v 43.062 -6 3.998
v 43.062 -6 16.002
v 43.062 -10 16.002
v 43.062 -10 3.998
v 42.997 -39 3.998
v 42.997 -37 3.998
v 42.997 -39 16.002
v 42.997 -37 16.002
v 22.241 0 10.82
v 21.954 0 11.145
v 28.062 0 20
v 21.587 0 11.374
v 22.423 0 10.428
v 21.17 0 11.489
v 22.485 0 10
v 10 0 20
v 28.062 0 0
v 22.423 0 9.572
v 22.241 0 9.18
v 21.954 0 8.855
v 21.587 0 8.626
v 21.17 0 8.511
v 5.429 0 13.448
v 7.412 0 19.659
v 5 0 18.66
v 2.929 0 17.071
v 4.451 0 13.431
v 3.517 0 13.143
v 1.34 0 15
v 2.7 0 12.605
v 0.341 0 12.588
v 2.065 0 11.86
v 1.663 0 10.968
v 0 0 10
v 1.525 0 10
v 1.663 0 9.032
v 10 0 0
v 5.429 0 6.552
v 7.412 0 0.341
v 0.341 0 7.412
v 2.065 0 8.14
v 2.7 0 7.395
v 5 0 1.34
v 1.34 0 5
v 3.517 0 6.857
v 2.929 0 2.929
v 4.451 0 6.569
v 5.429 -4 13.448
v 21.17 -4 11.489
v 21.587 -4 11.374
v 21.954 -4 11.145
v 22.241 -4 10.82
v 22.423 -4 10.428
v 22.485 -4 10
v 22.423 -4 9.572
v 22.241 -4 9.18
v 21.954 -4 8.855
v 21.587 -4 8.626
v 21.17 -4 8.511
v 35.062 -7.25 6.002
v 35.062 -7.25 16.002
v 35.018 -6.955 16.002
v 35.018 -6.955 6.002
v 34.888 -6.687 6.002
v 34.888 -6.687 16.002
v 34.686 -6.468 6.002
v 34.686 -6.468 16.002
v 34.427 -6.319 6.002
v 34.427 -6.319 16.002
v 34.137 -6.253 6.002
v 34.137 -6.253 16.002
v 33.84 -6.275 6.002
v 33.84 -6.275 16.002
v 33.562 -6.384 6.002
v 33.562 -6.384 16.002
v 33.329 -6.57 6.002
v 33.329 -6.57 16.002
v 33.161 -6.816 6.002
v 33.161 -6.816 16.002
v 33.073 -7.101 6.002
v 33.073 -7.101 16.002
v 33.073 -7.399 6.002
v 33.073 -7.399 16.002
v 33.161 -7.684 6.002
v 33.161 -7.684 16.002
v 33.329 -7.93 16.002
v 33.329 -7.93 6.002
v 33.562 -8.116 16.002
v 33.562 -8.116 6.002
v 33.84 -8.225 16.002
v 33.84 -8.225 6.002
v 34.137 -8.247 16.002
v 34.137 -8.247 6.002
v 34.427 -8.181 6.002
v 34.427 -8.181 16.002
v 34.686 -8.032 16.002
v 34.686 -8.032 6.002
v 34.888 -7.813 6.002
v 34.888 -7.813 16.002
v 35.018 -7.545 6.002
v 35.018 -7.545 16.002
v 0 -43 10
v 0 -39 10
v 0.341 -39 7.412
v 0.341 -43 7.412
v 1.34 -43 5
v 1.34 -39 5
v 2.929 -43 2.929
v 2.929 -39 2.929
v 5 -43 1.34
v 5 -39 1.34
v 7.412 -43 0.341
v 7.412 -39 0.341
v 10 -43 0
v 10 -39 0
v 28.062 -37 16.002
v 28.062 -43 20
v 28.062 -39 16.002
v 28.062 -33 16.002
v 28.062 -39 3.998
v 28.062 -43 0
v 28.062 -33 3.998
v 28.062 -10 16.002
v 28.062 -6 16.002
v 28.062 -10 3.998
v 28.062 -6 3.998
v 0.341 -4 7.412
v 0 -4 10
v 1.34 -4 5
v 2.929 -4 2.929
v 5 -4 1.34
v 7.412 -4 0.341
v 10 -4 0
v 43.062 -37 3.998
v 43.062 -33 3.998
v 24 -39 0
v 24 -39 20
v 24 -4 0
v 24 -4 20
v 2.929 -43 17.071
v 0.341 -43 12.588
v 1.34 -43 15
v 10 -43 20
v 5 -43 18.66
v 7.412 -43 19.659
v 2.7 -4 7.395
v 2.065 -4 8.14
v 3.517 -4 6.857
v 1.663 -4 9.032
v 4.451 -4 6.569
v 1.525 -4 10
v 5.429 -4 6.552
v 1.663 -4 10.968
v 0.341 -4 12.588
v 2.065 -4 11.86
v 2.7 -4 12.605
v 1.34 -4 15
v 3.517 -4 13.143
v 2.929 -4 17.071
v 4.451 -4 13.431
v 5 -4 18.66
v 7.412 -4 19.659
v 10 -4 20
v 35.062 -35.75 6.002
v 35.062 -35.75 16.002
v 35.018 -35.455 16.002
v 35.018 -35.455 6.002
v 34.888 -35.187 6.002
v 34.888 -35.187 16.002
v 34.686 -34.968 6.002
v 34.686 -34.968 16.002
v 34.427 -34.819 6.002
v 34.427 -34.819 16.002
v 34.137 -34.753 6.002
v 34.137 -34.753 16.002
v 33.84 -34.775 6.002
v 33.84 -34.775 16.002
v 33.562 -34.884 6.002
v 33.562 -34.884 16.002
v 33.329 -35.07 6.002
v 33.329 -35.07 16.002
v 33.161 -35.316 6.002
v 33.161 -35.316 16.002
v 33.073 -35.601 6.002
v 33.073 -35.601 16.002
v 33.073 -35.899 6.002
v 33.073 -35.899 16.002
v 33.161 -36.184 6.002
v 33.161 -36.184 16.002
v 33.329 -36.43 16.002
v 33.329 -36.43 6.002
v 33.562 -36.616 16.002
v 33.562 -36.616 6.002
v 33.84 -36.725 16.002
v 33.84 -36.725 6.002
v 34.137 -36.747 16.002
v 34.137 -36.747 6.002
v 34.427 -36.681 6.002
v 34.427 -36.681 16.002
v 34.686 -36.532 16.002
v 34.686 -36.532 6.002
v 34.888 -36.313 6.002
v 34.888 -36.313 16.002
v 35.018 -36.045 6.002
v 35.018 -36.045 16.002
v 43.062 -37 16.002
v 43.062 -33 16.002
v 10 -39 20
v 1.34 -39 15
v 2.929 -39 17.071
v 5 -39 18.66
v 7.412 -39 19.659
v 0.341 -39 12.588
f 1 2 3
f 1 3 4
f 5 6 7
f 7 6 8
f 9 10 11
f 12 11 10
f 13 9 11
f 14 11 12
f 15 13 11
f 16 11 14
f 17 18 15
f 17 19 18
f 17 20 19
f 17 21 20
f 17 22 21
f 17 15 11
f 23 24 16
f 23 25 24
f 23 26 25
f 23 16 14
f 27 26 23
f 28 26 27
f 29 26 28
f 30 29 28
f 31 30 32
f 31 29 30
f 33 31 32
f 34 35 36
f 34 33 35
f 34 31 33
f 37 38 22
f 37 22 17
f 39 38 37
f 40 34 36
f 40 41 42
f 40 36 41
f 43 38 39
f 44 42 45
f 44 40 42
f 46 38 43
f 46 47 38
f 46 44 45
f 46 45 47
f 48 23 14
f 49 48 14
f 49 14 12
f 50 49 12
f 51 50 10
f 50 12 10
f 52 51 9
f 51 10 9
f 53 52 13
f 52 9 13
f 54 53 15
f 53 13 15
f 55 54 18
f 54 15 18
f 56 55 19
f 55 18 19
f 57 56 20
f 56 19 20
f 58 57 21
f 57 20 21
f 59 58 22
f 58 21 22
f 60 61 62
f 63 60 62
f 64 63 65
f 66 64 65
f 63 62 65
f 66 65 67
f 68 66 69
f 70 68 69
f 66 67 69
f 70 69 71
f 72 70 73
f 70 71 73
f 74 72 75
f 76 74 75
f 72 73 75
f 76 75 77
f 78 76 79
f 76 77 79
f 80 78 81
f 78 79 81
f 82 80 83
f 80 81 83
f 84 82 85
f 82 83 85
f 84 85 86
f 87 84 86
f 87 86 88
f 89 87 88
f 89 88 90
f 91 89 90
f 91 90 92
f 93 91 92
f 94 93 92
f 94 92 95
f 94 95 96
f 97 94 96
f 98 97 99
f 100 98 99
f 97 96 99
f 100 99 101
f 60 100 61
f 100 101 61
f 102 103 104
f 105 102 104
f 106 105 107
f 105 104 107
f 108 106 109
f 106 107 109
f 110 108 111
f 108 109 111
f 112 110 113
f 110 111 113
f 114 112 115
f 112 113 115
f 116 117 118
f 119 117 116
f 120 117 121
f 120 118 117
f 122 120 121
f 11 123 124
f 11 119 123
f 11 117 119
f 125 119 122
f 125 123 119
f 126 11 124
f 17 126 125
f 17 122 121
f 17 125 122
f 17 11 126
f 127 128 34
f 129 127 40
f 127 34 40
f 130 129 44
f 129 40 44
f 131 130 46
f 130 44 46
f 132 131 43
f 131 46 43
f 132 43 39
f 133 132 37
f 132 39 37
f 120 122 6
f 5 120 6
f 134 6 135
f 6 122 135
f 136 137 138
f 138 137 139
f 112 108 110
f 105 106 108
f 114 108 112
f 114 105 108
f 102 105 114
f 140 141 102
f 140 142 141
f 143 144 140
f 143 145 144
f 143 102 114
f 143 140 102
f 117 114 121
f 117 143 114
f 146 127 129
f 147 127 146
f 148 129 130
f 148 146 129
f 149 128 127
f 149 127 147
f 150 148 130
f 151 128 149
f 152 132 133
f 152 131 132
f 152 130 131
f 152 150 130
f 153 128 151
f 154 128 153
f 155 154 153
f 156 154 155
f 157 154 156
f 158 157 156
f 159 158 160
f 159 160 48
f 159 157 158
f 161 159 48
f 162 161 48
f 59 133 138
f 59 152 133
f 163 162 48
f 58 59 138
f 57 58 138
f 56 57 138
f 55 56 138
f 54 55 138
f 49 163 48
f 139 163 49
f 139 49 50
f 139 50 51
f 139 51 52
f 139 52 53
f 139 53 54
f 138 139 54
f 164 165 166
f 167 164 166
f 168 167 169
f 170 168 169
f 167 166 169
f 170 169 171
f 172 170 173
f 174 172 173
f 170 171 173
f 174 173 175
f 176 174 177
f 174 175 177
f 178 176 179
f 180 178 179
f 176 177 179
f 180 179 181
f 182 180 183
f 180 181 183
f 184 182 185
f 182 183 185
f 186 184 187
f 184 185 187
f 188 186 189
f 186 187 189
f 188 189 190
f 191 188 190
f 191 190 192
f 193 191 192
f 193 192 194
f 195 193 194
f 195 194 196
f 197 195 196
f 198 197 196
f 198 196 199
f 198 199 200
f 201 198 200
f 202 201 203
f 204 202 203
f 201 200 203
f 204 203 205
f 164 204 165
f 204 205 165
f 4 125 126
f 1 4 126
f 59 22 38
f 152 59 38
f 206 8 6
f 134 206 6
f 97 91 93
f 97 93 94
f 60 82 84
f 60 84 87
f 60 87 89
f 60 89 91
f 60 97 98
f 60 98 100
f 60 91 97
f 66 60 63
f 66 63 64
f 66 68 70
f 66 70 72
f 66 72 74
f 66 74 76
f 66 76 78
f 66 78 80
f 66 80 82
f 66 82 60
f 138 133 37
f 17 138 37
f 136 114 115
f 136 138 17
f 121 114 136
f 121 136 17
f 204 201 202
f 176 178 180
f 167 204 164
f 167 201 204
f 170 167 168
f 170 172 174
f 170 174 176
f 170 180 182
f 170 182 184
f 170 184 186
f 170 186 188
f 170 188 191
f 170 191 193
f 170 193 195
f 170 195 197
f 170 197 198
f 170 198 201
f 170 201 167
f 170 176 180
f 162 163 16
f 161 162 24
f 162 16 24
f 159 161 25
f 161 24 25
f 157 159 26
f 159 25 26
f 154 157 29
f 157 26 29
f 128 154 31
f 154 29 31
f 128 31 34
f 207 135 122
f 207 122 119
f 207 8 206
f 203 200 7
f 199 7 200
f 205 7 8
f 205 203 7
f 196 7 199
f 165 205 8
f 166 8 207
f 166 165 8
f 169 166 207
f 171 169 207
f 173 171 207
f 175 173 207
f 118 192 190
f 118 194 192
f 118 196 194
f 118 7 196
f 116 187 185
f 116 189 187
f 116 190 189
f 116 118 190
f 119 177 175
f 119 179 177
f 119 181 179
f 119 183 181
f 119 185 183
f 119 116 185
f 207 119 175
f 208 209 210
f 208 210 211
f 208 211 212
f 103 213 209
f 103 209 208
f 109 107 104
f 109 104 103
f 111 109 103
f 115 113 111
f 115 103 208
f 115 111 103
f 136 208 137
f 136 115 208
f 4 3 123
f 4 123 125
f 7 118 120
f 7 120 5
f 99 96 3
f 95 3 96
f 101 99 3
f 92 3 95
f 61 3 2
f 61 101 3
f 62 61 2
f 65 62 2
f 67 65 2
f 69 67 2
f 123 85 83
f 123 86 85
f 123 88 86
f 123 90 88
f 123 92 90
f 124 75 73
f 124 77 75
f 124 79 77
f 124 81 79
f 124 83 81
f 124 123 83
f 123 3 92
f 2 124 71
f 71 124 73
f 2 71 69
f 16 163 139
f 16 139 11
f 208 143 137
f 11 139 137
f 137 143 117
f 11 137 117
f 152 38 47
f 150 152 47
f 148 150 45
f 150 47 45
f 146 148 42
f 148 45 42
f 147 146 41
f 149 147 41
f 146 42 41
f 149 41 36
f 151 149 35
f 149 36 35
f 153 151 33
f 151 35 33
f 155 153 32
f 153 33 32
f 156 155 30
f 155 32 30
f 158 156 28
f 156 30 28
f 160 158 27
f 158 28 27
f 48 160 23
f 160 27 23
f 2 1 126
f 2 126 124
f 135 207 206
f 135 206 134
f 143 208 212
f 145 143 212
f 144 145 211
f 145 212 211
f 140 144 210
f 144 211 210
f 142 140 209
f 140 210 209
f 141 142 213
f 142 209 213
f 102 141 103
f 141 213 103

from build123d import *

# Parameters (mm, degrees)
EXTRUDE_1_DEPTH     = 20
CUT_EXTRUDE_2_DEPTH = 20
SKETCH_6_W          = 20
SKETCH_6_H          = 46
EXTRUDE_2_DEPTH     = 3
SKETCH_7_W          = 4
SKETCH_7_H          = 38
CUT_EXTRUDE_4_DEPTH = 23
SKETCH_8_W          = 27.047351985
SKETCH_8_H          = 20
EXTRUDE_3_DEPTH     = 3
SKETCH_9_W          = 28.062086438
SKETCH_9_H          = 3
CUT_EXTRUDE_5_DEPTH = 50
CUT_EXTRUDE_6_DEPTH = 50
SKETCH_11_W         = 6.001651559
SKETCH_11_H         = 4
EXTRUDE_4_DEPTH     = 15
SKETCH_16_W         = 14.934651965
SKETCH_16_H         = 12.003303118
EXTRUDE_5_DEPTH     = 2
SKETCH_21_R         = 1
CUT_EXTRUDE_8_DEPTH = 10


with BuildPart() as part:
    # 草图1 → 凸台-拉伸1 (new body)
    with BuildSketch(Plane.XY):
        Polygon((25.062086438, -46), (25.062086438, 0), (0, 0), (0, -4), (20, -4), (20, -42), (0, -42), (0, -46), align=None)
    extrude(amount=EXTRUDE_1_DEPTH)

    # 草图3 → 切除-拉伸2 (cut)
    with BuildSketch(Plane(origin=(0, 0, 0), x_dir=(1, 0, 0), z_dir=(0, 1, 0))):
        with BuildLine():
            Line((5.429347826, -13.448374319), (21.170329997, -11.4885069))
            ThreePointArc((21.170329997, -11.4885069), (22.485, -10), (21.170329997, -8.5114931))
            Line((21.170329997, -8.5114931), (5.429347826, -6.551625681))
            ThreePointArc((5.429347826, -6.551625681), (1.525, -10), (5.429347826, -13.448374319))
        make_face()
    extrude(amount=-CUT_EXTRUDE_2_DEPTH, mode=Mode.SUBTRACT)

    # 草图6 → 凸台-拉伸2 (add)
    with BuildSketch(Plane(origin=(25.062086438, 0, 0), x_dir=(0, 0, -1), z_dir=(1, 0, 0))):
        with Locations((-10, -23)):
            Rectangle(SKETCH_6_W, SKETCH_6_H)
    extrude(amount=EXTRUDE_2_DEPTH)

    # 草图7 → 切除-拉伸4 (cut)
    with BuildSketch(Plane.XY.offset(20)):
        with Locations((22, -23)):
            Rectangle(SKETCH_7_W, SKETCH_7_H)
    extrude(amount=-CUT_EXTRUDE_4_DEPTH, mode=Mode.SUBTRACT)

    # 草图8 → 凸台-拉伸3 (add)
    with BuildSketch(Plane(origin=(0, -42, 0), x_dir=(1, 0, 0), z_dir=(0, 1, 0))):
        with Locations((13.523675993, -10)):
            Rectangle(SKETCH_8_W, SKETCH_8_H)
    extrude(amount=EXTRUDE_3_DEPTH)

    # 草图9 → 切除-拉伸5 (cut)
    with BuildSketch(Plane.XY.offset(20)):
        with Locations((14.031043219, -44.5)):
            Rectangle(SKETCH_9_W, SKETCH_9_H)
    extrude(amount=-CUT_EXTRUDE_5_DEPTH, mode=Mode.SUBTRACT)

    # 草图10 → 切除-拉伸6 (cut)
    with BuildSketch(Plane(origin=(0, 0, 0), x_dir=(1, 0, 0), z_dir=(0, 1, 0))):
        with BuildLine():
            Line((10, 0), (0, 0))
            Line((0, 0), (0, -10))
            ThreePointArc((0, -10), (2.928932188, -2.928932188), (10, 0))
        make_face()
        with BuildLine():
            ThreePointArc((10, -20), (2.928932188, -17.071067812), (0, -10))
            Line((0, -10), (0, -20))
            Line((0, -20), (10, -20))
        make_face()
    extrude(amount=-CUT_EXTRUDE_6_DEPTH, mode=Mode.SUBTRACT)

    # 草图11 → 凸台-拉伸4 (add)
    with BuildSketch(Plane(origin=(28.062086438, 0, 0), x_dir=(0, 0, -1), z_dir=(1, 0, 0))):
        with Locations((-13.00082578, -8)):
            Rectangle(SKETCH_11_W, SKETCH_11_H)
        with Locations((-6.999174221, -8)):
            Rectangle(SKETCH_11_W, SKETCH_11_H)
        with Locations((-6.999174221, -35)):
            Rectangle(SKETCH_11_W, SKETCH_11_H)
        with Locations((-13.00082578, -35)):
            Rectangle(SKETCH_11_W, SKETCH_11_H)
    extrude(amount=EXTRUDE_4_DEPTH)

    # 草图16 → 凸台-拉伸5 (add)
    with BuildSketch(Plane.XZ.offset(37)):
        with Locations((35.529412421, 10)):
            Rectangle(SKETCH_16_W, SKETCH_16_H)
    extrude(amount=EXTRUDE_5_DEPTH)

    # 草图21 → 切除-拉伸8 (cut)
    with BuildSketch(Plane.XY.offset(16.001651559)):
        with Locations((34.062086438, -7.25)):
            Circle(SKETCH_21_R)
        with Locations((34.062086438, -35.75)):
            Circle(SKETCH_21_R)
    extrude(amount=-CUT_EXTRUDE_8_DEPTH, mode=Mode.SUBTRACT)


solid = part.part
